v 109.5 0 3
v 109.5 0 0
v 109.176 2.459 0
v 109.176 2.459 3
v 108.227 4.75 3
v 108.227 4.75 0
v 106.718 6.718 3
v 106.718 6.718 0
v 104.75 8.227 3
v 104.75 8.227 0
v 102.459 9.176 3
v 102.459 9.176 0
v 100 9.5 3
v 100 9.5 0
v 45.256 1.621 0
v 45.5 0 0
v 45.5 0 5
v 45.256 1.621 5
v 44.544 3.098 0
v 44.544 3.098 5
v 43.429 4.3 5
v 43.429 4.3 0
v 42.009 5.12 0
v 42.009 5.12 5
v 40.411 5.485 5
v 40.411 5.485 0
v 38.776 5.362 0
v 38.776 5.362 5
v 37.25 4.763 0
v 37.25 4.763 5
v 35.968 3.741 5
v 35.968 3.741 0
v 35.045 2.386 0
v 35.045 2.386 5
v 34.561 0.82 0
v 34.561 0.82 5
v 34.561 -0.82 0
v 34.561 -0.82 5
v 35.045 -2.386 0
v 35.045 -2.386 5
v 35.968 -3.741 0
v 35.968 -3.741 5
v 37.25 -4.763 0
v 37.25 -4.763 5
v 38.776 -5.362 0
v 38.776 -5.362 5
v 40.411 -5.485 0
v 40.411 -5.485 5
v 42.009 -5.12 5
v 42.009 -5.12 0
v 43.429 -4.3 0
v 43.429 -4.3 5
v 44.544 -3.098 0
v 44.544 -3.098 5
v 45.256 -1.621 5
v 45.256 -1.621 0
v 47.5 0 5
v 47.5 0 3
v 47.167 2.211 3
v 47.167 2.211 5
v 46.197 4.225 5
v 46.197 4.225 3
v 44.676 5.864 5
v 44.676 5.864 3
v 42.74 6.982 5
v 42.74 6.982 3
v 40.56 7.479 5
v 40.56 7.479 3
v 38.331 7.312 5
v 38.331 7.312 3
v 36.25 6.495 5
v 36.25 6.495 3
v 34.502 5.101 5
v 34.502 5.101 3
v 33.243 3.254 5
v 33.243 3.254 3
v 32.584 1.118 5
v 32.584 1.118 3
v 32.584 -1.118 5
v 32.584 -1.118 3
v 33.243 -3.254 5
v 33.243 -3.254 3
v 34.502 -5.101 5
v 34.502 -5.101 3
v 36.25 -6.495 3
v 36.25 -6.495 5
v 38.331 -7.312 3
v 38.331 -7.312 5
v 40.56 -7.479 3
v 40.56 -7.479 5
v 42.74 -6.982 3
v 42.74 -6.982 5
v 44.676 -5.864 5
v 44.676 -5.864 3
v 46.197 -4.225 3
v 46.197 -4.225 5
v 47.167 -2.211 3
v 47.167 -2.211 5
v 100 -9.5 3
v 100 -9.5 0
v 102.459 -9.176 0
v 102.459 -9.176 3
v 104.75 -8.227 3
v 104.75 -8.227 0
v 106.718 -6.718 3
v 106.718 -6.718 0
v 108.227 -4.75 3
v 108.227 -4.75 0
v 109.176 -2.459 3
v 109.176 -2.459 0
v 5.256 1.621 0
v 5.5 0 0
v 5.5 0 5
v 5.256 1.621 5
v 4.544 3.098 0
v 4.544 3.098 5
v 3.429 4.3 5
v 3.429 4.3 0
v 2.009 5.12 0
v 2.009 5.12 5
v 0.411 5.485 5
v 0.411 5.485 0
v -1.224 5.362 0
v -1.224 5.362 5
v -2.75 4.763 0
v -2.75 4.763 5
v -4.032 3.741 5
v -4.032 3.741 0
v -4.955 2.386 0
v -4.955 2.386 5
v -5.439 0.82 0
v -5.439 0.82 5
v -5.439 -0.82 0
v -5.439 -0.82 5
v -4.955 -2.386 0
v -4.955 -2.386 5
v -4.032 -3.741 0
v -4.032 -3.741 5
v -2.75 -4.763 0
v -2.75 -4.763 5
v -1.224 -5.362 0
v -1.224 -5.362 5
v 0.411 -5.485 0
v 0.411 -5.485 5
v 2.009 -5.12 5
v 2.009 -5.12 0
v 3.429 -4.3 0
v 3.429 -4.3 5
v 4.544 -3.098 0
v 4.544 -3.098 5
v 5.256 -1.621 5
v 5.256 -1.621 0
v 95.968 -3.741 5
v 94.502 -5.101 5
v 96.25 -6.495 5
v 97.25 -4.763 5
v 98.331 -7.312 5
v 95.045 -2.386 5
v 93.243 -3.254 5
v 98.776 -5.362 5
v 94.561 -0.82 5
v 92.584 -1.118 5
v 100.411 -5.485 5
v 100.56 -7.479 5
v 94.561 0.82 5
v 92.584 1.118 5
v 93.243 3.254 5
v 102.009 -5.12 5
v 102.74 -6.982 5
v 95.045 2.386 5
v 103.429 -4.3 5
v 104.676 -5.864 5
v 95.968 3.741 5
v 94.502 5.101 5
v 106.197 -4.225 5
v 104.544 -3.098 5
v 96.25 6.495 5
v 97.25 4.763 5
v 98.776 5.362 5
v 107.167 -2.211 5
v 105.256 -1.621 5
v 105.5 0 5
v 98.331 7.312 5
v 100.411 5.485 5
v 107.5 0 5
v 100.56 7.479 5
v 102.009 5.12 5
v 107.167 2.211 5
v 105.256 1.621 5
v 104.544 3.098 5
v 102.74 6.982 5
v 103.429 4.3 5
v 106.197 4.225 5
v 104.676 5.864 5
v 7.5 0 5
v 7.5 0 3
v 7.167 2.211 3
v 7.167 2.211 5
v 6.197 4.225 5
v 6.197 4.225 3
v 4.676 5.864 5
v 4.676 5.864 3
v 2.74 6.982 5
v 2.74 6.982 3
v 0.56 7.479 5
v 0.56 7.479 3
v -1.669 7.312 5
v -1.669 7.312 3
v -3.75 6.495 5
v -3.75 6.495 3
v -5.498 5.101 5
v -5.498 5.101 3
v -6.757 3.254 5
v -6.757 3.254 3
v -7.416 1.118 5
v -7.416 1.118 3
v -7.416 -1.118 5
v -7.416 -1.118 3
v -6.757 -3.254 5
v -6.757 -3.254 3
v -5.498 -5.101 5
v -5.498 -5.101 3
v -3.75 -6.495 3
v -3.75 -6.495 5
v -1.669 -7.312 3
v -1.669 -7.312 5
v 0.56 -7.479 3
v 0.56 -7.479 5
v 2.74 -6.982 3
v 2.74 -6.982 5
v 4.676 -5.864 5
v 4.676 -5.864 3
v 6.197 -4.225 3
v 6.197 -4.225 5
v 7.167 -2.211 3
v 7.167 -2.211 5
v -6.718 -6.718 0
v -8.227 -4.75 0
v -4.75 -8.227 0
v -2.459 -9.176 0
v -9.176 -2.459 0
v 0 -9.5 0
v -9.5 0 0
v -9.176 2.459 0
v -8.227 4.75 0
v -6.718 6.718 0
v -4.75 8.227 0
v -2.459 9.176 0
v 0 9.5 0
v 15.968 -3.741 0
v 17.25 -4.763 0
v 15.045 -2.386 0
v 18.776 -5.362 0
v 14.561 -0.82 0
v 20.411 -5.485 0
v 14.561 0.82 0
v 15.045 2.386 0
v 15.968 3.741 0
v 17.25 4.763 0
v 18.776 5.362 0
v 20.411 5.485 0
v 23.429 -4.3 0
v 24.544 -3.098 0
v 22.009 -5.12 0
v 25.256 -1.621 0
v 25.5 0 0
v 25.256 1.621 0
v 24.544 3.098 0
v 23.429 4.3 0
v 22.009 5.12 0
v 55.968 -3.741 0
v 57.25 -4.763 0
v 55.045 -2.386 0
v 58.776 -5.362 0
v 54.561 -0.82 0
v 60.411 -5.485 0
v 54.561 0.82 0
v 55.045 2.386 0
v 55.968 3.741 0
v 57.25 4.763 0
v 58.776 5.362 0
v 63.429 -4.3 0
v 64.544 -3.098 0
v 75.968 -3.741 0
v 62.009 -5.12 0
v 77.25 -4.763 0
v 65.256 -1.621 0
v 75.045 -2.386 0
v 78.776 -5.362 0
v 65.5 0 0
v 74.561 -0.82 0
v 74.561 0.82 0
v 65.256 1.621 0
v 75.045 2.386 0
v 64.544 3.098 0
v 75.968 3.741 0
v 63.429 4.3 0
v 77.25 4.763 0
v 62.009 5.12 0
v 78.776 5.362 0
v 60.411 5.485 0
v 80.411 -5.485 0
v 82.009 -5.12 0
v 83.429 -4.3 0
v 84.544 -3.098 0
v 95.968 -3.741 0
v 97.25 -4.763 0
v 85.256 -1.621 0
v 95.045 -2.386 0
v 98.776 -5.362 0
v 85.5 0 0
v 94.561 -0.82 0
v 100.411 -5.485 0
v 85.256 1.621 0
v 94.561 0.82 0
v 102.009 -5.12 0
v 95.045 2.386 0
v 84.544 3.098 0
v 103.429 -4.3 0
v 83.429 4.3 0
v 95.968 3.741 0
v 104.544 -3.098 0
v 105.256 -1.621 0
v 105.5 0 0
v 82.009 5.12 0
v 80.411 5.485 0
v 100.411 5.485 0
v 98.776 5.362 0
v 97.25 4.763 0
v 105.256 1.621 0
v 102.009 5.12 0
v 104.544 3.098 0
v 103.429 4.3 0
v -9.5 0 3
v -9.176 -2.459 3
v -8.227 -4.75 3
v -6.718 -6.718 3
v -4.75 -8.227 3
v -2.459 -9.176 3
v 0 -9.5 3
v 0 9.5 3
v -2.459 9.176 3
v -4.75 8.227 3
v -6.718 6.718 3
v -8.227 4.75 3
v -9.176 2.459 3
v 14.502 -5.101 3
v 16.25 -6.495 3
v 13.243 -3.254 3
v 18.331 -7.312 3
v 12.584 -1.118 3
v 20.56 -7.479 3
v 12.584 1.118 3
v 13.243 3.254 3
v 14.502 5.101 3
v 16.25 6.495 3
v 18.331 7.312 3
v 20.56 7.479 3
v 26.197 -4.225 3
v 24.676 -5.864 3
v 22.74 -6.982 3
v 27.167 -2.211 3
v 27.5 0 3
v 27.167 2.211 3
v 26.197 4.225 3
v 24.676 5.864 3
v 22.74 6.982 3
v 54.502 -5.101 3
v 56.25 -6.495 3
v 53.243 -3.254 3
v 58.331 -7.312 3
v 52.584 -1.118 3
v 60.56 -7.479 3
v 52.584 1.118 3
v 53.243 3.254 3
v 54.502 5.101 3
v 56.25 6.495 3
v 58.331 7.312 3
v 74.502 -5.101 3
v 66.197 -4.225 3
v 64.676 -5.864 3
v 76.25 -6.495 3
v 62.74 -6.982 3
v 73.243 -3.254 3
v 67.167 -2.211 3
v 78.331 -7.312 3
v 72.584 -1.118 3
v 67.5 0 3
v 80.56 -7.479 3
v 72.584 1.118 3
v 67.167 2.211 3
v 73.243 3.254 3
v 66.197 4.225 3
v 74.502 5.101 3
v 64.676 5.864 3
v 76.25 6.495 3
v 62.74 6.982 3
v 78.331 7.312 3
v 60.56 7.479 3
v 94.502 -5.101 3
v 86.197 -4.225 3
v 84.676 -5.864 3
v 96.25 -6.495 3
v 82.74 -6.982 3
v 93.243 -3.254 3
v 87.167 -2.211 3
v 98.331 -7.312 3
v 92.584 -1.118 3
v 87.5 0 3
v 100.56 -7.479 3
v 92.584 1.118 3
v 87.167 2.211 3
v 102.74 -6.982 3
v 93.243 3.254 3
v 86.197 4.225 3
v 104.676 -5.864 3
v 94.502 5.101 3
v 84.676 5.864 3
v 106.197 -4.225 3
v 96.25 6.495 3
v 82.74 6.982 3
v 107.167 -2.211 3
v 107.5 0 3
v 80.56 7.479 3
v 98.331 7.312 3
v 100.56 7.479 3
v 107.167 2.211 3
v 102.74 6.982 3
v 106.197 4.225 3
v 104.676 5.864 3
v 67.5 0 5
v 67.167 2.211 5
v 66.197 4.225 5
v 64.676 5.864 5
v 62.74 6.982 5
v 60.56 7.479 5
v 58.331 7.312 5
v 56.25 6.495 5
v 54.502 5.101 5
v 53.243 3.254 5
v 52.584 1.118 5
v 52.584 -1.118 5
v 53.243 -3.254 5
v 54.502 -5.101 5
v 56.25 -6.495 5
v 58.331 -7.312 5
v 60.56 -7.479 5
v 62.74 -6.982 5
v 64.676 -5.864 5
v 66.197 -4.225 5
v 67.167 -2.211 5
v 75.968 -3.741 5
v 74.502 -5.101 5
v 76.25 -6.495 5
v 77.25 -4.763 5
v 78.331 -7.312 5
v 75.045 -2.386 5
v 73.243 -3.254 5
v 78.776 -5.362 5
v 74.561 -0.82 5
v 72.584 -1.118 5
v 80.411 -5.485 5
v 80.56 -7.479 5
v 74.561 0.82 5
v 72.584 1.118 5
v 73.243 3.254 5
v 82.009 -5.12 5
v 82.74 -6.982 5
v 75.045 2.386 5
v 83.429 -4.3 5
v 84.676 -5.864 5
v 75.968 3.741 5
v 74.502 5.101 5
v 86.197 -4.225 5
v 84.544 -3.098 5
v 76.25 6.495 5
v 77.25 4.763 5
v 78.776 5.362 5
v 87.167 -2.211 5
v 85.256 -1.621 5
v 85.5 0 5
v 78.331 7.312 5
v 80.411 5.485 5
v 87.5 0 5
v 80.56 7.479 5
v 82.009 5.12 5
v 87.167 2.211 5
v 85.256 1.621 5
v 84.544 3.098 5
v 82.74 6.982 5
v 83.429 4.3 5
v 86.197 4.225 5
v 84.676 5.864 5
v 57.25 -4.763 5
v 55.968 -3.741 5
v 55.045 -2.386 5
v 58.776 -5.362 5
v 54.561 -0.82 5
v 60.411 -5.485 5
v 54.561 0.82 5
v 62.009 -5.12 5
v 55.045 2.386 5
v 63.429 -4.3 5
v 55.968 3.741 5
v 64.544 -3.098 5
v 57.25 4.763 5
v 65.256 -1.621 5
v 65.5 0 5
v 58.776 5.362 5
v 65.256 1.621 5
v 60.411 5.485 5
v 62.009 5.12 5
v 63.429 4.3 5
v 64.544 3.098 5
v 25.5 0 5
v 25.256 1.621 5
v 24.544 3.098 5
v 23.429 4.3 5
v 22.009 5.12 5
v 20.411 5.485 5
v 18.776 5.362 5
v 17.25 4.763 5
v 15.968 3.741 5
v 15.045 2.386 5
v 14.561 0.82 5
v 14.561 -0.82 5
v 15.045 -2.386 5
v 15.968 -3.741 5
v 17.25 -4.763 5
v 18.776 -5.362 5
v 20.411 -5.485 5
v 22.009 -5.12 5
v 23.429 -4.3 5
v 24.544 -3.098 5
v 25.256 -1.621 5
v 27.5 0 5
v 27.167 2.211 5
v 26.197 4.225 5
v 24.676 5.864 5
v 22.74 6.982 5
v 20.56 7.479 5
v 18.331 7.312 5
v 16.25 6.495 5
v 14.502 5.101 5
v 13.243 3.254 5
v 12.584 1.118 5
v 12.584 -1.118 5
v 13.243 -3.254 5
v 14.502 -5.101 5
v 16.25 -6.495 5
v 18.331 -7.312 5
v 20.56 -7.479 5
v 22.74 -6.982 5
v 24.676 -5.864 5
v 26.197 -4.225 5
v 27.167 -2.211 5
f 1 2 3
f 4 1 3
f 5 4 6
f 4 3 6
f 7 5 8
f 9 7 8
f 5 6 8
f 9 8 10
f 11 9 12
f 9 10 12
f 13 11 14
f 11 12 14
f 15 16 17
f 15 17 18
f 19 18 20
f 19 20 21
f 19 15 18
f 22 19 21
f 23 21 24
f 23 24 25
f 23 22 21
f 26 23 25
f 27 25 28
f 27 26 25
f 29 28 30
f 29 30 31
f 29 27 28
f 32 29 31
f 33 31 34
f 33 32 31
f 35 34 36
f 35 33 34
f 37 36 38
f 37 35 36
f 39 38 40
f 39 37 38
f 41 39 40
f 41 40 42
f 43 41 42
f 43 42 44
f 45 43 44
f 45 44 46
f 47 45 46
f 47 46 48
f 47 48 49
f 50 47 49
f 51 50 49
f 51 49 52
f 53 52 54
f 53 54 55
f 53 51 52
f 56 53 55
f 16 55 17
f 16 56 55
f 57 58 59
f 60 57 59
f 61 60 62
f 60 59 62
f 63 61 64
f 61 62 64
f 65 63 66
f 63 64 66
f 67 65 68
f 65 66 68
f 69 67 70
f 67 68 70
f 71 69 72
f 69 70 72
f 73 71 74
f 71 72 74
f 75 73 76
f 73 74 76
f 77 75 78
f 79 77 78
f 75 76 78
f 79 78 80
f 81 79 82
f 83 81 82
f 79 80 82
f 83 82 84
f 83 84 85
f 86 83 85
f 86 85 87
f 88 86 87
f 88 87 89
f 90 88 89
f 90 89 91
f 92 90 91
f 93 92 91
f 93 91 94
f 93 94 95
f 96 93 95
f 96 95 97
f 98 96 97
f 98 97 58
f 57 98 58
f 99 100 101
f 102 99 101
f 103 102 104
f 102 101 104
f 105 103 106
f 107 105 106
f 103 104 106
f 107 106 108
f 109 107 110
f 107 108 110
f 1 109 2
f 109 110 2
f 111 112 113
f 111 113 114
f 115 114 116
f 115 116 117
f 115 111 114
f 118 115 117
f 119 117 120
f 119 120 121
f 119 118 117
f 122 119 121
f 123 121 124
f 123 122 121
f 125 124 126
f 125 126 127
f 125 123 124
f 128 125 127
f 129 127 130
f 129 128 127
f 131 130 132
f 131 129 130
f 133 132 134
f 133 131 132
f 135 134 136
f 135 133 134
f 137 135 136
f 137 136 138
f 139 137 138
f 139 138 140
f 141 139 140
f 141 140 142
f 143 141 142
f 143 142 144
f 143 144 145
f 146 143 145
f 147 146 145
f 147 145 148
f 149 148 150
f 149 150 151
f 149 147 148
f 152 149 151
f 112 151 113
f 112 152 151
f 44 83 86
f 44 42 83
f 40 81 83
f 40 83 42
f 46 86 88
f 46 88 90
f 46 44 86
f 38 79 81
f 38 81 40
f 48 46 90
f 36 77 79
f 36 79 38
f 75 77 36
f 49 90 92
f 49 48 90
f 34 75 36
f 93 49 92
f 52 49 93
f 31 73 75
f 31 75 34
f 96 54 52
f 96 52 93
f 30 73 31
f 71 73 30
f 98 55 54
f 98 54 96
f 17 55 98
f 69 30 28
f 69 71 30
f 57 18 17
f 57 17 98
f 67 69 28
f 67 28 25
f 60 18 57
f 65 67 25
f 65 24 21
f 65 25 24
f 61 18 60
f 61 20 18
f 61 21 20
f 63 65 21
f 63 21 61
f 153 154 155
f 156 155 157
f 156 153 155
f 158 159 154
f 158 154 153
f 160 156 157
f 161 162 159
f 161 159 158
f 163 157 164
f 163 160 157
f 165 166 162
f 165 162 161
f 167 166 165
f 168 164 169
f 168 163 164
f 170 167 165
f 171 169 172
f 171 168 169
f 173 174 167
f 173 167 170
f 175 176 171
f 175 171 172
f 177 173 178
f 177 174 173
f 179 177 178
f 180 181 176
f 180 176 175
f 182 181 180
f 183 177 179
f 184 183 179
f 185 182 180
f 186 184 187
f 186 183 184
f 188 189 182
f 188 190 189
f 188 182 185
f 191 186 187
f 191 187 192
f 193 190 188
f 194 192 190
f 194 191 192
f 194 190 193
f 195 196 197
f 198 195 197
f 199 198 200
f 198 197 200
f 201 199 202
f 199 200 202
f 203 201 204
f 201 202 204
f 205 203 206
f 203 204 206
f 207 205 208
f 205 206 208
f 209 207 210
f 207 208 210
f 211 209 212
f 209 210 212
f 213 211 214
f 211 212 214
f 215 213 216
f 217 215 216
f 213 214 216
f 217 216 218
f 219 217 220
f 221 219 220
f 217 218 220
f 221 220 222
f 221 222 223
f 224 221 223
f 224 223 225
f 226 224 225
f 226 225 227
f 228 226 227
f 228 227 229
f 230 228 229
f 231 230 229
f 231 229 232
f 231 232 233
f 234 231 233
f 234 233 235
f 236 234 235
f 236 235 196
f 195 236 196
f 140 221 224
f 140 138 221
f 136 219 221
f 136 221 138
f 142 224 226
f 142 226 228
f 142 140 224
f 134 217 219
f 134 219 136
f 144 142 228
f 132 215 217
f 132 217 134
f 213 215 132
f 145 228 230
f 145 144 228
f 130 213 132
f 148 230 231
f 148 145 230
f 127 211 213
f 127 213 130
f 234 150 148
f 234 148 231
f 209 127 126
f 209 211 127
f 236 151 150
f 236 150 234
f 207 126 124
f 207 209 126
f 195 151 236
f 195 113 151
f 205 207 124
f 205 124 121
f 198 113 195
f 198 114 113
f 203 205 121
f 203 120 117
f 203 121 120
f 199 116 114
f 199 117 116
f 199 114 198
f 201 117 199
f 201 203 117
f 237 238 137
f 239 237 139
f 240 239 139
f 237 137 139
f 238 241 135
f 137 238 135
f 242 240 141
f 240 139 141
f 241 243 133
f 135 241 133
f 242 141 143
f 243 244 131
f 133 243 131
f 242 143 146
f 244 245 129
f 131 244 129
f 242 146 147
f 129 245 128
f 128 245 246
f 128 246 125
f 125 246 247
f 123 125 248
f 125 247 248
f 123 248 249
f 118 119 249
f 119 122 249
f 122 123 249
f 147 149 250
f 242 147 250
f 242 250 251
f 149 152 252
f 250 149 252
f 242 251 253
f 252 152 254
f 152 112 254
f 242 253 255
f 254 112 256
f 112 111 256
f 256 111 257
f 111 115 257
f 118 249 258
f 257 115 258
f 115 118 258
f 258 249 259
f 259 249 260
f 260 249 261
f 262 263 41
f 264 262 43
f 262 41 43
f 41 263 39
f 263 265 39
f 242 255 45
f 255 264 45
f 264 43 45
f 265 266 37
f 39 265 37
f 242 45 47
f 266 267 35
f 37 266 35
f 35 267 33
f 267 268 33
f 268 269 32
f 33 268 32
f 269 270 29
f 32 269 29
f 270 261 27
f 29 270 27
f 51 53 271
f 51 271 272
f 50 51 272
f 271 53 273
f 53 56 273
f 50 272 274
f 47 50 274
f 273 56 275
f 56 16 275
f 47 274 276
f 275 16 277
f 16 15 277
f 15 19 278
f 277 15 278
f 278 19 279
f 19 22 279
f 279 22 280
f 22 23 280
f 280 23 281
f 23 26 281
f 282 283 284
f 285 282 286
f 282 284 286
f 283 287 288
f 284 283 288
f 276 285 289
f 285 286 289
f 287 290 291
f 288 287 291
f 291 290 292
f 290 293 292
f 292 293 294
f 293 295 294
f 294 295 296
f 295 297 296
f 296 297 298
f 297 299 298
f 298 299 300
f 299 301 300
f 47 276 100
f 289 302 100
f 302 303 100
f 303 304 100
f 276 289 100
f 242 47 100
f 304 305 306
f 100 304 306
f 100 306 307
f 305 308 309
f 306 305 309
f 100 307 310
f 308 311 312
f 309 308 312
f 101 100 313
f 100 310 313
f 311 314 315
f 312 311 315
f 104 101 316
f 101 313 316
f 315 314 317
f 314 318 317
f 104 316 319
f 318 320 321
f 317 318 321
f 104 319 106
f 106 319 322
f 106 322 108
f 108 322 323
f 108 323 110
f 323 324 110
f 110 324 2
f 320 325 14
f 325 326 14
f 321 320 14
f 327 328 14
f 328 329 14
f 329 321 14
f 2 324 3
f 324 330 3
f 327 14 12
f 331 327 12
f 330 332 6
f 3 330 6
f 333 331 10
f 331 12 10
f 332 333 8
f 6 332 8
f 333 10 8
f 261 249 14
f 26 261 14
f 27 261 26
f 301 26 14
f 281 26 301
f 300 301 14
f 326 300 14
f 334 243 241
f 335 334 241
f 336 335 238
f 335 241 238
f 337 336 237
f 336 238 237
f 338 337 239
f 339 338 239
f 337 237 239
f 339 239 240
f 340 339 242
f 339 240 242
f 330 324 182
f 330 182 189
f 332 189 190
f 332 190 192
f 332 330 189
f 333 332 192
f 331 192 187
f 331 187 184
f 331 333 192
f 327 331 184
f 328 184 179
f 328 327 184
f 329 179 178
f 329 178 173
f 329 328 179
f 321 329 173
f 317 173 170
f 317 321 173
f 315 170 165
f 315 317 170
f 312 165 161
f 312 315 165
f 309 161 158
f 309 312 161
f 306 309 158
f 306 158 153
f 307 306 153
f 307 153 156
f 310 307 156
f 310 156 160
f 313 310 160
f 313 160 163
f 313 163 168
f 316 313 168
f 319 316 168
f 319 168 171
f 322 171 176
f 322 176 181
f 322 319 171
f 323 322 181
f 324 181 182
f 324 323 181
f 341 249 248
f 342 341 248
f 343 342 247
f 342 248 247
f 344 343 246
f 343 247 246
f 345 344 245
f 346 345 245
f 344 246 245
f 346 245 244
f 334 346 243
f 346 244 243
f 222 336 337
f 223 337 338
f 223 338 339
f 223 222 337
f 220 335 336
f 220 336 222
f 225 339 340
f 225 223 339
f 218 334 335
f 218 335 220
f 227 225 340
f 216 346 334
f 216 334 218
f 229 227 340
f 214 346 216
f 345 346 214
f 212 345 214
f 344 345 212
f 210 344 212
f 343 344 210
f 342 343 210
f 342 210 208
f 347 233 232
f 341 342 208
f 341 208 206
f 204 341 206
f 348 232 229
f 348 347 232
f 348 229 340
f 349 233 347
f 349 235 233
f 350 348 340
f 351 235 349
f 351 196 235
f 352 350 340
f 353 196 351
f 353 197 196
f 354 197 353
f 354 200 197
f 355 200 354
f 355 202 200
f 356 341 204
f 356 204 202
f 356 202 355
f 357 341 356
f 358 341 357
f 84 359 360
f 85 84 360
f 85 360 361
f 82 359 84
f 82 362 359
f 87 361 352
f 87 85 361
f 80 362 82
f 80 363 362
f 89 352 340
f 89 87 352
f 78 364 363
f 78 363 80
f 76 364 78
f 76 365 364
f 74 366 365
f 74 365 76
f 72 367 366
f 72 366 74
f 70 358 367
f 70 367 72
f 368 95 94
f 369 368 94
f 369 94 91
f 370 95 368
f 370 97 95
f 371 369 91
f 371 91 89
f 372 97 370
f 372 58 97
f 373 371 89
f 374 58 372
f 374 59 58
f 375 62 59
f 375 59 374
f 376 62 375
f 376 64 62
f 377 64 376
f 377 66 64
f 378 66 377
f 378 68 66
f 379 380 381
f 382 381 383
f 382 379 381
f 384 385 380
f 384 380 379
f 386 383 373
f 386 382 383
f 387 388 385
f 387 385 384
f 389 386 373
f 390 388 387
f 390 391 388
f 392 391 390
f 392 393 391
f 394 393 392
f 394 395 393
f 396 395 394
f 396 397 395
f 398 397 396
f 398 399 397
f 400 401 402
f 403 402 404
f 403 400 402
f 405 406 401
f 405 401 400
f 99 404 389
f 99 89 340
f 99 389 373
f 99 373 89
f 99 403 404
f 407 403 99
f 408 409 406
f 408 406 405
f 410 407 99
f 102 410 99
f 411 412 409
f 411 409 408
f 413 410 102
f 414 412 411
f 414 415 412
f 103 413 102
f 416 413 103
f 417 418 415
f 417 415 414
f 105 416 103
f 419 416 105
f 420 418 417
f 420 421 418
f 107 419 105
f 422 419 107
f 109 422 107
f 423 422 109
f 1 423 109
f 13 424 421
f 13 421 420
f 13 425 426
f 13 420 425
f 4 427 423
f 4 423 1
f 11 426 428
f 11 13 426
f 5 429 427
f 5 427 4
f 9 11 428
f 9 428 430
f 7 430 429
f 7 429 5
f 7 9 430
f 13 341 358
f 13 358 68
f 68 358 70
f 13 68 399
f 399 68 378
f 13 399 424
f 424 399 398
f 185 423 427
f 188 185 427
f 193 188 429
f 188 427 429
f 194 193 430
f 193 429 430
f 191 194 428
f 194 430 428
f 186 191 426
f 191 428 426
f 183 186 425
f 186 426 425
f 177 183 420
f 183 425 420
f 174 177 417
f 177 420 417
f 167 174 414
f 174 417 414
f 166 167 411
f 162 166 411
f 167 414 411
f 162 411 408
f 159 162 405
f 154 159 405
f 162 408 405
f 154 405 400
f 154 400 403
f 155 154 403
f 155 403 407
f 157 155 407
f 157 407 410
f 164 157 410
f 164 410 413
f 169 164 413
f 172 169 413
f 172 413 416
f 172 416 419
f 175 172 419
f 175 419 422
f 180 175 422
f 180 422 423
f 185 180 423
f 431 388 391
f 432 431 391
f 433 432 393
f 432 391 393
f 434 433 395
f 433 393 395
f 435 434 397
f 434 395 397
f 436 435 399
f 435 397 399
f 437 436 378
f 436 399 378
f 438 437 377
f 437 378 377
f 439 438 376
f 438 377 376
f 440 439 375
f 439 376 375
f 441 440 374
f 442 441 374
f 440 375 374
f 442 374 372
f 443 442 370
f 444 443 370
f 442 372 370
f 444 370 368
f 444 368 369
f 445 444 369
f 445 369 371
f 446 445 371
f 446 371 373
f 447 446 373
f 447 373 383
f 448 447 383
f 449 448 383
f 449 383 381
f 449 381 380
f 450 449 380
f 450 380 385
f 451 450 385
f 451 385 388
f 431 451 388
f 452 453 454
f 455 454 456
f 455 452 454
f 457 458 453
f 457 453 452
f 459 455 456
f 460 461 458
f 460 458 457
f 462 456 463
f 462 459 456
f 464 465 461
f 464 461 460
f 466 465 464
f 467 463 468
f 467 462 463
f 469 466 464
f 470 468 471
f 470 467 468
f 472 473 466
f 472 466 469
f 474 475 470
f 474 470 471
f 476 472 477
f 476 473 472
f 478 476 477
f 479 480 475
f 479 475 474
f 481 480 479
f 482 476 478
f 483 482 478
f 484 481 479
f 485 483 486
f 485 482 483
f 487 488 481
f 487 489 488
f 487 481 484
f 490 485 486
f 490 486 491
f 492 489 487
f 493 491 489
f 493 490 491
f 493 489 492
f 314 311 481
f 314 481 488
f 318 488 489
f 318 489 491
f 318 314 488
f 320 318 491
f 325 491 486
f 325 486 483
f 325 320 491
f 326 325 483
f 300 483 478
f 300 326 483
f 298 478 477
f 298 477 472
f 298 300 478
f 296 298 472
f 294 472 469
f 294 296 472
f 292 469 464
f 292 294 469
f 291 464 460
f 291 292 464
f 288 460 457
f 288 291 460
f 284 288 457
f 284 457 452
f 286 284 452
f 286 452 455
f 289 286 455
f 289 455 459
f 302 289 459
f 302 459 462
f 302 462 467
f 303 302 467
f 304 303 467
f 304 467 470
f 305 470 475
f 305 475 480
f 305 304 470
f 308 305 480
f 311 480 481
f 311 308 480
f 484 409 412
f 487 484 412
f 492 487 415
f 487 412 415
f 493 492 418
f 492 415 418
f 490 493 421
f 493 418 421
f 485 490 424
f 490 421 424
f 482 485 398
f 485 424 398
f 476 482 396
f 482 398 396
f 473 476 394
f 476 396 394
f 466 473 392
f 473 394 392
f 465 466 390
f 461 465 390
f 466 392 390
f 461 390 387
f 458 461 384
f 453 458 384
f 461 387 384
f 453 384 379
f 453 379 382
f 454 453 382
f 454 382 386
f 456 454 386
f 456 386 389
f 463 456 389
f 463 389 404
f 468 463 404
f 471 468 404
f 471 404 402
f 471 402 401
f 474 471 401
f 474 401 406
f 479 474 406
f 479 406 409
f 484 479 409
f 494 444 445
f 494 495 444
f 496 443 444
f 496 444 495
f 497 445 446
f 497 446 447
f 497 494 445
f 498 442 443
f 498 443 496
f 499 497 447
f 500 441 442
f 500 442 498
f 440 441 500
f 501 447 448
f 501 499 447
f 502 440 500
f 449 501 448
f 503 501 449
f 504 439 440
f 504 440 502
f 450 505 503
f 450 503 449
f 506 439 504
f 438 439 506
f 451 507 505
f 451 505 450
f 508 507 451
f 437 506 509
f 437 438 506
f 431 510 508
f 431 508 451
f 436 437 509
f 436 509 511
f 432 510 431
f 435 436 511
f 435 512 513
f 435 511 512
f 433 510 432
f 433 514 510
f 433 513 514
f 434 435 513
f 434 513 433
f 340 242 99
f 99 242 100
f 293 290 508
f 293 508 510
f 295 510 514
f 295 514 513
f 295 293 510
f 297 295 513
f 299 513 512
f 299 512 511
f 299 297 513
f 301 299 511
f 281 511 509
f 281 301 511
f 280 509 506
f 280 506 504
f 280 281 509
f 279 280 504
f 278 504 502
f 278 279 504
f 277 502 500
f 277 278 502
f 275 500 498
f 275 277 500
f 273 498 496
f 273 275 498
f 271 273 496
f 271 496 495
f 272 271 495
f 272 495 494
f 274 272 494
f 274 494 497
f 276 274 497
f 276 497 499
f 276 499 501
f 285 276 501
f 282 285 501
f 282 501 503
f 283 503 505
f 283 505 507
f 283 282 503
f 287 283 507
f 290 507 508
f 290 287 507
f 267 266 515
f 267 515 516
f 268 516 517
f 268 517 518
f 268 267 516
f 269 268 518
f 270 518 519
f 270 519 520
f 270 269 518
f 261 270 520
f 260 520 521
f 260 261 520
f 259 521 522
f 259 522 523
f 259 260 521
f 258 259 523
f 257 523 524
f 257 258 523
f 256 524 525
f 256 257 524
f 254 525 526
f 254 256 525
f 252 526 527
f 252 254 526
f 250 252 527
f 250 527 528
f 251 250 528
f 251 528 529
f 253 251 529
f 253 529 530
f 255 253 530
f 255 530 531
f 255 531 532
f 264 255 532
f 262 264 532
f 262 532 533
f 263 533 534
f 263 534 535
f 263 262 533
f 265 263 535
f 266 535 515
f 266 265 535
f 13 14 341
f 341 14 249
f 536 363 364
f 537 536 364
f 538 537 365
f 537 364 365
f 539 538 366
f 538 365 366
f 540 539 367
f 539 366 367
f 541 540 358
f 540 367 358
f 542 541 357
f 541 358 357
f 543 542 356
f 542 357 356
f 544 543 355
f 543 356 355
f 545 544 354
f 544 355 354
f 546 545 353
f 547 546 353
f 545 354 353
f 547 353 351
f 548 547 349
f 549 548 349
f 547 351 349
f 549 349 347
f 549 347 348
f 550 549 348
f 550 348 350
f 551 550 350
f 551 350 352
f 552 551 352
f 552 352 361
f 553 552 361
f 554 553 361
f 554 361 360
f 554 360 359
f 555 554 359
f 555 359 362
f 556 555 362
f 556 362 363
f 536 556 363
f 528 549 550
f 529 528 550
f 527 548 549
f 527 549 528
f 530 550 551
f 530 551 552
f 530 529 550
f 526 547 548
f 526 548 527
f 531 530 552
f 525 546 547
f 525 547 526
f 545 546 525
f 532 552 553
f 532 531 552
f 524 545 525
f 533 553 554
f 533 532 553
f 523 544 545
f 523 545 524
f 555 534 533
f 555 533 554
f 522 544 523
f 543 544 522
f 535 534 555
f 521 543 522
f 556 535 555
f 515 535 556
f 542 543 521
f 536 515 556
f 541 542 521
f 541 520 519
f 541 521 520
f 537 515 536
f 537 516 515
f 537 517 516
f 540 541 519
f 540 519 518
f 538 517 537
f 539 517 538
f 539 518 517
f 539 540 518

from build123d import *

# Parameters (mm, degrees)
F0_R     = 7.5
F1_DEPTH = 3
F0_R_2   = 5.5
F2_DEPTH = 5
F3_ANGLE = 270


with BuildPart() as f1:
    # F0 (on Top) → F1 (new body)
    with BuildSketch(Plane.XY):
        with BuildLine():
            Line((100, 9.5), (0, 9.5))
            ThreePointArc((0, 9.5), (-6.717514, 6.717514), (-9.5, 0))
            ThreePointArc((-9.5, 0), (-6.717514, -6.717514), (0, -9.5))
            Line((0, -9.5), (100, -9.5))
            ThreePointArc((100, -9.5), (106.717514, -6.717514), (109.5, 0))
            ThreePointArc((109.5, 0), (106.717514, 6.717514), (100, 9.5))
        make_face()
        Circle(F0_R, mode=Mode.SUBTRACT)
        with Locations((20, 0)):
            Circle(F0_R, mode=Mode.SUBTRACT)
        with Locations((40, 0)):
            Circle(F0_R, mode=Mode.SUBTRACT)
        with Locations((60, 0)):
            Circle(F0_R, mode=Mode.SUBTRACT)
        with Locations((80, 0)):
            Circle(F0_R, mode=Mode.SUBTRACT)
        with Locations((100, 0)):
            Circle(F0_R, mode=Mode.SUBTRACT)
    extrude(amount=F1_DEPTH)

    # F0 (on Top) → F2 (join)
    with BuildSketch(Plane.XY):
        Circle(F0_R)
        Circle(F0_R_2, mode=Mode.SUBTRACT)
        with Locations((20, 0)):
            Circle(F0_R)
        with Locations((20, 0)):
            Circle(F0_R_2, mode=Mode.SUBTRACT)
        with Locations((40, 0)):
            Circle(F0_R)
        with Locations((40, 0)):
            Circle(F0_R_2, mode=Mode.SUBTRACT)
        with Locations((60, 0)):
            Circle(F0_R)
        with Locations((60, 0)):
            Circle(F0_R_2, mode=Mode.SUBTRACT)
        with Locations((80, 0)):
            Circle(F0_R)
        with Locations((80, 0)):
            Circle(F0_R_2, mode=Mode.SUBTRACT)
        with Locations((100, 0)):
            Circle(F0_R)
        with Locations((100, 0)):
            Circle(F0_R_2, mode=Mode.SUBTRACT)
    extrude(amount=F2_DEPTH)


with BuildPart() as f3_1:
    # F3: copy of F1
    add(f1.part.rotate(Axis((0, 0, 0), (0, 0, -1)), F3_ANGLE))


with BuildPart() as f3_1_1:
    # F4: moved
    add(f3_1.part.moved(Location((20, 0, 0))))


solid = f1.part
